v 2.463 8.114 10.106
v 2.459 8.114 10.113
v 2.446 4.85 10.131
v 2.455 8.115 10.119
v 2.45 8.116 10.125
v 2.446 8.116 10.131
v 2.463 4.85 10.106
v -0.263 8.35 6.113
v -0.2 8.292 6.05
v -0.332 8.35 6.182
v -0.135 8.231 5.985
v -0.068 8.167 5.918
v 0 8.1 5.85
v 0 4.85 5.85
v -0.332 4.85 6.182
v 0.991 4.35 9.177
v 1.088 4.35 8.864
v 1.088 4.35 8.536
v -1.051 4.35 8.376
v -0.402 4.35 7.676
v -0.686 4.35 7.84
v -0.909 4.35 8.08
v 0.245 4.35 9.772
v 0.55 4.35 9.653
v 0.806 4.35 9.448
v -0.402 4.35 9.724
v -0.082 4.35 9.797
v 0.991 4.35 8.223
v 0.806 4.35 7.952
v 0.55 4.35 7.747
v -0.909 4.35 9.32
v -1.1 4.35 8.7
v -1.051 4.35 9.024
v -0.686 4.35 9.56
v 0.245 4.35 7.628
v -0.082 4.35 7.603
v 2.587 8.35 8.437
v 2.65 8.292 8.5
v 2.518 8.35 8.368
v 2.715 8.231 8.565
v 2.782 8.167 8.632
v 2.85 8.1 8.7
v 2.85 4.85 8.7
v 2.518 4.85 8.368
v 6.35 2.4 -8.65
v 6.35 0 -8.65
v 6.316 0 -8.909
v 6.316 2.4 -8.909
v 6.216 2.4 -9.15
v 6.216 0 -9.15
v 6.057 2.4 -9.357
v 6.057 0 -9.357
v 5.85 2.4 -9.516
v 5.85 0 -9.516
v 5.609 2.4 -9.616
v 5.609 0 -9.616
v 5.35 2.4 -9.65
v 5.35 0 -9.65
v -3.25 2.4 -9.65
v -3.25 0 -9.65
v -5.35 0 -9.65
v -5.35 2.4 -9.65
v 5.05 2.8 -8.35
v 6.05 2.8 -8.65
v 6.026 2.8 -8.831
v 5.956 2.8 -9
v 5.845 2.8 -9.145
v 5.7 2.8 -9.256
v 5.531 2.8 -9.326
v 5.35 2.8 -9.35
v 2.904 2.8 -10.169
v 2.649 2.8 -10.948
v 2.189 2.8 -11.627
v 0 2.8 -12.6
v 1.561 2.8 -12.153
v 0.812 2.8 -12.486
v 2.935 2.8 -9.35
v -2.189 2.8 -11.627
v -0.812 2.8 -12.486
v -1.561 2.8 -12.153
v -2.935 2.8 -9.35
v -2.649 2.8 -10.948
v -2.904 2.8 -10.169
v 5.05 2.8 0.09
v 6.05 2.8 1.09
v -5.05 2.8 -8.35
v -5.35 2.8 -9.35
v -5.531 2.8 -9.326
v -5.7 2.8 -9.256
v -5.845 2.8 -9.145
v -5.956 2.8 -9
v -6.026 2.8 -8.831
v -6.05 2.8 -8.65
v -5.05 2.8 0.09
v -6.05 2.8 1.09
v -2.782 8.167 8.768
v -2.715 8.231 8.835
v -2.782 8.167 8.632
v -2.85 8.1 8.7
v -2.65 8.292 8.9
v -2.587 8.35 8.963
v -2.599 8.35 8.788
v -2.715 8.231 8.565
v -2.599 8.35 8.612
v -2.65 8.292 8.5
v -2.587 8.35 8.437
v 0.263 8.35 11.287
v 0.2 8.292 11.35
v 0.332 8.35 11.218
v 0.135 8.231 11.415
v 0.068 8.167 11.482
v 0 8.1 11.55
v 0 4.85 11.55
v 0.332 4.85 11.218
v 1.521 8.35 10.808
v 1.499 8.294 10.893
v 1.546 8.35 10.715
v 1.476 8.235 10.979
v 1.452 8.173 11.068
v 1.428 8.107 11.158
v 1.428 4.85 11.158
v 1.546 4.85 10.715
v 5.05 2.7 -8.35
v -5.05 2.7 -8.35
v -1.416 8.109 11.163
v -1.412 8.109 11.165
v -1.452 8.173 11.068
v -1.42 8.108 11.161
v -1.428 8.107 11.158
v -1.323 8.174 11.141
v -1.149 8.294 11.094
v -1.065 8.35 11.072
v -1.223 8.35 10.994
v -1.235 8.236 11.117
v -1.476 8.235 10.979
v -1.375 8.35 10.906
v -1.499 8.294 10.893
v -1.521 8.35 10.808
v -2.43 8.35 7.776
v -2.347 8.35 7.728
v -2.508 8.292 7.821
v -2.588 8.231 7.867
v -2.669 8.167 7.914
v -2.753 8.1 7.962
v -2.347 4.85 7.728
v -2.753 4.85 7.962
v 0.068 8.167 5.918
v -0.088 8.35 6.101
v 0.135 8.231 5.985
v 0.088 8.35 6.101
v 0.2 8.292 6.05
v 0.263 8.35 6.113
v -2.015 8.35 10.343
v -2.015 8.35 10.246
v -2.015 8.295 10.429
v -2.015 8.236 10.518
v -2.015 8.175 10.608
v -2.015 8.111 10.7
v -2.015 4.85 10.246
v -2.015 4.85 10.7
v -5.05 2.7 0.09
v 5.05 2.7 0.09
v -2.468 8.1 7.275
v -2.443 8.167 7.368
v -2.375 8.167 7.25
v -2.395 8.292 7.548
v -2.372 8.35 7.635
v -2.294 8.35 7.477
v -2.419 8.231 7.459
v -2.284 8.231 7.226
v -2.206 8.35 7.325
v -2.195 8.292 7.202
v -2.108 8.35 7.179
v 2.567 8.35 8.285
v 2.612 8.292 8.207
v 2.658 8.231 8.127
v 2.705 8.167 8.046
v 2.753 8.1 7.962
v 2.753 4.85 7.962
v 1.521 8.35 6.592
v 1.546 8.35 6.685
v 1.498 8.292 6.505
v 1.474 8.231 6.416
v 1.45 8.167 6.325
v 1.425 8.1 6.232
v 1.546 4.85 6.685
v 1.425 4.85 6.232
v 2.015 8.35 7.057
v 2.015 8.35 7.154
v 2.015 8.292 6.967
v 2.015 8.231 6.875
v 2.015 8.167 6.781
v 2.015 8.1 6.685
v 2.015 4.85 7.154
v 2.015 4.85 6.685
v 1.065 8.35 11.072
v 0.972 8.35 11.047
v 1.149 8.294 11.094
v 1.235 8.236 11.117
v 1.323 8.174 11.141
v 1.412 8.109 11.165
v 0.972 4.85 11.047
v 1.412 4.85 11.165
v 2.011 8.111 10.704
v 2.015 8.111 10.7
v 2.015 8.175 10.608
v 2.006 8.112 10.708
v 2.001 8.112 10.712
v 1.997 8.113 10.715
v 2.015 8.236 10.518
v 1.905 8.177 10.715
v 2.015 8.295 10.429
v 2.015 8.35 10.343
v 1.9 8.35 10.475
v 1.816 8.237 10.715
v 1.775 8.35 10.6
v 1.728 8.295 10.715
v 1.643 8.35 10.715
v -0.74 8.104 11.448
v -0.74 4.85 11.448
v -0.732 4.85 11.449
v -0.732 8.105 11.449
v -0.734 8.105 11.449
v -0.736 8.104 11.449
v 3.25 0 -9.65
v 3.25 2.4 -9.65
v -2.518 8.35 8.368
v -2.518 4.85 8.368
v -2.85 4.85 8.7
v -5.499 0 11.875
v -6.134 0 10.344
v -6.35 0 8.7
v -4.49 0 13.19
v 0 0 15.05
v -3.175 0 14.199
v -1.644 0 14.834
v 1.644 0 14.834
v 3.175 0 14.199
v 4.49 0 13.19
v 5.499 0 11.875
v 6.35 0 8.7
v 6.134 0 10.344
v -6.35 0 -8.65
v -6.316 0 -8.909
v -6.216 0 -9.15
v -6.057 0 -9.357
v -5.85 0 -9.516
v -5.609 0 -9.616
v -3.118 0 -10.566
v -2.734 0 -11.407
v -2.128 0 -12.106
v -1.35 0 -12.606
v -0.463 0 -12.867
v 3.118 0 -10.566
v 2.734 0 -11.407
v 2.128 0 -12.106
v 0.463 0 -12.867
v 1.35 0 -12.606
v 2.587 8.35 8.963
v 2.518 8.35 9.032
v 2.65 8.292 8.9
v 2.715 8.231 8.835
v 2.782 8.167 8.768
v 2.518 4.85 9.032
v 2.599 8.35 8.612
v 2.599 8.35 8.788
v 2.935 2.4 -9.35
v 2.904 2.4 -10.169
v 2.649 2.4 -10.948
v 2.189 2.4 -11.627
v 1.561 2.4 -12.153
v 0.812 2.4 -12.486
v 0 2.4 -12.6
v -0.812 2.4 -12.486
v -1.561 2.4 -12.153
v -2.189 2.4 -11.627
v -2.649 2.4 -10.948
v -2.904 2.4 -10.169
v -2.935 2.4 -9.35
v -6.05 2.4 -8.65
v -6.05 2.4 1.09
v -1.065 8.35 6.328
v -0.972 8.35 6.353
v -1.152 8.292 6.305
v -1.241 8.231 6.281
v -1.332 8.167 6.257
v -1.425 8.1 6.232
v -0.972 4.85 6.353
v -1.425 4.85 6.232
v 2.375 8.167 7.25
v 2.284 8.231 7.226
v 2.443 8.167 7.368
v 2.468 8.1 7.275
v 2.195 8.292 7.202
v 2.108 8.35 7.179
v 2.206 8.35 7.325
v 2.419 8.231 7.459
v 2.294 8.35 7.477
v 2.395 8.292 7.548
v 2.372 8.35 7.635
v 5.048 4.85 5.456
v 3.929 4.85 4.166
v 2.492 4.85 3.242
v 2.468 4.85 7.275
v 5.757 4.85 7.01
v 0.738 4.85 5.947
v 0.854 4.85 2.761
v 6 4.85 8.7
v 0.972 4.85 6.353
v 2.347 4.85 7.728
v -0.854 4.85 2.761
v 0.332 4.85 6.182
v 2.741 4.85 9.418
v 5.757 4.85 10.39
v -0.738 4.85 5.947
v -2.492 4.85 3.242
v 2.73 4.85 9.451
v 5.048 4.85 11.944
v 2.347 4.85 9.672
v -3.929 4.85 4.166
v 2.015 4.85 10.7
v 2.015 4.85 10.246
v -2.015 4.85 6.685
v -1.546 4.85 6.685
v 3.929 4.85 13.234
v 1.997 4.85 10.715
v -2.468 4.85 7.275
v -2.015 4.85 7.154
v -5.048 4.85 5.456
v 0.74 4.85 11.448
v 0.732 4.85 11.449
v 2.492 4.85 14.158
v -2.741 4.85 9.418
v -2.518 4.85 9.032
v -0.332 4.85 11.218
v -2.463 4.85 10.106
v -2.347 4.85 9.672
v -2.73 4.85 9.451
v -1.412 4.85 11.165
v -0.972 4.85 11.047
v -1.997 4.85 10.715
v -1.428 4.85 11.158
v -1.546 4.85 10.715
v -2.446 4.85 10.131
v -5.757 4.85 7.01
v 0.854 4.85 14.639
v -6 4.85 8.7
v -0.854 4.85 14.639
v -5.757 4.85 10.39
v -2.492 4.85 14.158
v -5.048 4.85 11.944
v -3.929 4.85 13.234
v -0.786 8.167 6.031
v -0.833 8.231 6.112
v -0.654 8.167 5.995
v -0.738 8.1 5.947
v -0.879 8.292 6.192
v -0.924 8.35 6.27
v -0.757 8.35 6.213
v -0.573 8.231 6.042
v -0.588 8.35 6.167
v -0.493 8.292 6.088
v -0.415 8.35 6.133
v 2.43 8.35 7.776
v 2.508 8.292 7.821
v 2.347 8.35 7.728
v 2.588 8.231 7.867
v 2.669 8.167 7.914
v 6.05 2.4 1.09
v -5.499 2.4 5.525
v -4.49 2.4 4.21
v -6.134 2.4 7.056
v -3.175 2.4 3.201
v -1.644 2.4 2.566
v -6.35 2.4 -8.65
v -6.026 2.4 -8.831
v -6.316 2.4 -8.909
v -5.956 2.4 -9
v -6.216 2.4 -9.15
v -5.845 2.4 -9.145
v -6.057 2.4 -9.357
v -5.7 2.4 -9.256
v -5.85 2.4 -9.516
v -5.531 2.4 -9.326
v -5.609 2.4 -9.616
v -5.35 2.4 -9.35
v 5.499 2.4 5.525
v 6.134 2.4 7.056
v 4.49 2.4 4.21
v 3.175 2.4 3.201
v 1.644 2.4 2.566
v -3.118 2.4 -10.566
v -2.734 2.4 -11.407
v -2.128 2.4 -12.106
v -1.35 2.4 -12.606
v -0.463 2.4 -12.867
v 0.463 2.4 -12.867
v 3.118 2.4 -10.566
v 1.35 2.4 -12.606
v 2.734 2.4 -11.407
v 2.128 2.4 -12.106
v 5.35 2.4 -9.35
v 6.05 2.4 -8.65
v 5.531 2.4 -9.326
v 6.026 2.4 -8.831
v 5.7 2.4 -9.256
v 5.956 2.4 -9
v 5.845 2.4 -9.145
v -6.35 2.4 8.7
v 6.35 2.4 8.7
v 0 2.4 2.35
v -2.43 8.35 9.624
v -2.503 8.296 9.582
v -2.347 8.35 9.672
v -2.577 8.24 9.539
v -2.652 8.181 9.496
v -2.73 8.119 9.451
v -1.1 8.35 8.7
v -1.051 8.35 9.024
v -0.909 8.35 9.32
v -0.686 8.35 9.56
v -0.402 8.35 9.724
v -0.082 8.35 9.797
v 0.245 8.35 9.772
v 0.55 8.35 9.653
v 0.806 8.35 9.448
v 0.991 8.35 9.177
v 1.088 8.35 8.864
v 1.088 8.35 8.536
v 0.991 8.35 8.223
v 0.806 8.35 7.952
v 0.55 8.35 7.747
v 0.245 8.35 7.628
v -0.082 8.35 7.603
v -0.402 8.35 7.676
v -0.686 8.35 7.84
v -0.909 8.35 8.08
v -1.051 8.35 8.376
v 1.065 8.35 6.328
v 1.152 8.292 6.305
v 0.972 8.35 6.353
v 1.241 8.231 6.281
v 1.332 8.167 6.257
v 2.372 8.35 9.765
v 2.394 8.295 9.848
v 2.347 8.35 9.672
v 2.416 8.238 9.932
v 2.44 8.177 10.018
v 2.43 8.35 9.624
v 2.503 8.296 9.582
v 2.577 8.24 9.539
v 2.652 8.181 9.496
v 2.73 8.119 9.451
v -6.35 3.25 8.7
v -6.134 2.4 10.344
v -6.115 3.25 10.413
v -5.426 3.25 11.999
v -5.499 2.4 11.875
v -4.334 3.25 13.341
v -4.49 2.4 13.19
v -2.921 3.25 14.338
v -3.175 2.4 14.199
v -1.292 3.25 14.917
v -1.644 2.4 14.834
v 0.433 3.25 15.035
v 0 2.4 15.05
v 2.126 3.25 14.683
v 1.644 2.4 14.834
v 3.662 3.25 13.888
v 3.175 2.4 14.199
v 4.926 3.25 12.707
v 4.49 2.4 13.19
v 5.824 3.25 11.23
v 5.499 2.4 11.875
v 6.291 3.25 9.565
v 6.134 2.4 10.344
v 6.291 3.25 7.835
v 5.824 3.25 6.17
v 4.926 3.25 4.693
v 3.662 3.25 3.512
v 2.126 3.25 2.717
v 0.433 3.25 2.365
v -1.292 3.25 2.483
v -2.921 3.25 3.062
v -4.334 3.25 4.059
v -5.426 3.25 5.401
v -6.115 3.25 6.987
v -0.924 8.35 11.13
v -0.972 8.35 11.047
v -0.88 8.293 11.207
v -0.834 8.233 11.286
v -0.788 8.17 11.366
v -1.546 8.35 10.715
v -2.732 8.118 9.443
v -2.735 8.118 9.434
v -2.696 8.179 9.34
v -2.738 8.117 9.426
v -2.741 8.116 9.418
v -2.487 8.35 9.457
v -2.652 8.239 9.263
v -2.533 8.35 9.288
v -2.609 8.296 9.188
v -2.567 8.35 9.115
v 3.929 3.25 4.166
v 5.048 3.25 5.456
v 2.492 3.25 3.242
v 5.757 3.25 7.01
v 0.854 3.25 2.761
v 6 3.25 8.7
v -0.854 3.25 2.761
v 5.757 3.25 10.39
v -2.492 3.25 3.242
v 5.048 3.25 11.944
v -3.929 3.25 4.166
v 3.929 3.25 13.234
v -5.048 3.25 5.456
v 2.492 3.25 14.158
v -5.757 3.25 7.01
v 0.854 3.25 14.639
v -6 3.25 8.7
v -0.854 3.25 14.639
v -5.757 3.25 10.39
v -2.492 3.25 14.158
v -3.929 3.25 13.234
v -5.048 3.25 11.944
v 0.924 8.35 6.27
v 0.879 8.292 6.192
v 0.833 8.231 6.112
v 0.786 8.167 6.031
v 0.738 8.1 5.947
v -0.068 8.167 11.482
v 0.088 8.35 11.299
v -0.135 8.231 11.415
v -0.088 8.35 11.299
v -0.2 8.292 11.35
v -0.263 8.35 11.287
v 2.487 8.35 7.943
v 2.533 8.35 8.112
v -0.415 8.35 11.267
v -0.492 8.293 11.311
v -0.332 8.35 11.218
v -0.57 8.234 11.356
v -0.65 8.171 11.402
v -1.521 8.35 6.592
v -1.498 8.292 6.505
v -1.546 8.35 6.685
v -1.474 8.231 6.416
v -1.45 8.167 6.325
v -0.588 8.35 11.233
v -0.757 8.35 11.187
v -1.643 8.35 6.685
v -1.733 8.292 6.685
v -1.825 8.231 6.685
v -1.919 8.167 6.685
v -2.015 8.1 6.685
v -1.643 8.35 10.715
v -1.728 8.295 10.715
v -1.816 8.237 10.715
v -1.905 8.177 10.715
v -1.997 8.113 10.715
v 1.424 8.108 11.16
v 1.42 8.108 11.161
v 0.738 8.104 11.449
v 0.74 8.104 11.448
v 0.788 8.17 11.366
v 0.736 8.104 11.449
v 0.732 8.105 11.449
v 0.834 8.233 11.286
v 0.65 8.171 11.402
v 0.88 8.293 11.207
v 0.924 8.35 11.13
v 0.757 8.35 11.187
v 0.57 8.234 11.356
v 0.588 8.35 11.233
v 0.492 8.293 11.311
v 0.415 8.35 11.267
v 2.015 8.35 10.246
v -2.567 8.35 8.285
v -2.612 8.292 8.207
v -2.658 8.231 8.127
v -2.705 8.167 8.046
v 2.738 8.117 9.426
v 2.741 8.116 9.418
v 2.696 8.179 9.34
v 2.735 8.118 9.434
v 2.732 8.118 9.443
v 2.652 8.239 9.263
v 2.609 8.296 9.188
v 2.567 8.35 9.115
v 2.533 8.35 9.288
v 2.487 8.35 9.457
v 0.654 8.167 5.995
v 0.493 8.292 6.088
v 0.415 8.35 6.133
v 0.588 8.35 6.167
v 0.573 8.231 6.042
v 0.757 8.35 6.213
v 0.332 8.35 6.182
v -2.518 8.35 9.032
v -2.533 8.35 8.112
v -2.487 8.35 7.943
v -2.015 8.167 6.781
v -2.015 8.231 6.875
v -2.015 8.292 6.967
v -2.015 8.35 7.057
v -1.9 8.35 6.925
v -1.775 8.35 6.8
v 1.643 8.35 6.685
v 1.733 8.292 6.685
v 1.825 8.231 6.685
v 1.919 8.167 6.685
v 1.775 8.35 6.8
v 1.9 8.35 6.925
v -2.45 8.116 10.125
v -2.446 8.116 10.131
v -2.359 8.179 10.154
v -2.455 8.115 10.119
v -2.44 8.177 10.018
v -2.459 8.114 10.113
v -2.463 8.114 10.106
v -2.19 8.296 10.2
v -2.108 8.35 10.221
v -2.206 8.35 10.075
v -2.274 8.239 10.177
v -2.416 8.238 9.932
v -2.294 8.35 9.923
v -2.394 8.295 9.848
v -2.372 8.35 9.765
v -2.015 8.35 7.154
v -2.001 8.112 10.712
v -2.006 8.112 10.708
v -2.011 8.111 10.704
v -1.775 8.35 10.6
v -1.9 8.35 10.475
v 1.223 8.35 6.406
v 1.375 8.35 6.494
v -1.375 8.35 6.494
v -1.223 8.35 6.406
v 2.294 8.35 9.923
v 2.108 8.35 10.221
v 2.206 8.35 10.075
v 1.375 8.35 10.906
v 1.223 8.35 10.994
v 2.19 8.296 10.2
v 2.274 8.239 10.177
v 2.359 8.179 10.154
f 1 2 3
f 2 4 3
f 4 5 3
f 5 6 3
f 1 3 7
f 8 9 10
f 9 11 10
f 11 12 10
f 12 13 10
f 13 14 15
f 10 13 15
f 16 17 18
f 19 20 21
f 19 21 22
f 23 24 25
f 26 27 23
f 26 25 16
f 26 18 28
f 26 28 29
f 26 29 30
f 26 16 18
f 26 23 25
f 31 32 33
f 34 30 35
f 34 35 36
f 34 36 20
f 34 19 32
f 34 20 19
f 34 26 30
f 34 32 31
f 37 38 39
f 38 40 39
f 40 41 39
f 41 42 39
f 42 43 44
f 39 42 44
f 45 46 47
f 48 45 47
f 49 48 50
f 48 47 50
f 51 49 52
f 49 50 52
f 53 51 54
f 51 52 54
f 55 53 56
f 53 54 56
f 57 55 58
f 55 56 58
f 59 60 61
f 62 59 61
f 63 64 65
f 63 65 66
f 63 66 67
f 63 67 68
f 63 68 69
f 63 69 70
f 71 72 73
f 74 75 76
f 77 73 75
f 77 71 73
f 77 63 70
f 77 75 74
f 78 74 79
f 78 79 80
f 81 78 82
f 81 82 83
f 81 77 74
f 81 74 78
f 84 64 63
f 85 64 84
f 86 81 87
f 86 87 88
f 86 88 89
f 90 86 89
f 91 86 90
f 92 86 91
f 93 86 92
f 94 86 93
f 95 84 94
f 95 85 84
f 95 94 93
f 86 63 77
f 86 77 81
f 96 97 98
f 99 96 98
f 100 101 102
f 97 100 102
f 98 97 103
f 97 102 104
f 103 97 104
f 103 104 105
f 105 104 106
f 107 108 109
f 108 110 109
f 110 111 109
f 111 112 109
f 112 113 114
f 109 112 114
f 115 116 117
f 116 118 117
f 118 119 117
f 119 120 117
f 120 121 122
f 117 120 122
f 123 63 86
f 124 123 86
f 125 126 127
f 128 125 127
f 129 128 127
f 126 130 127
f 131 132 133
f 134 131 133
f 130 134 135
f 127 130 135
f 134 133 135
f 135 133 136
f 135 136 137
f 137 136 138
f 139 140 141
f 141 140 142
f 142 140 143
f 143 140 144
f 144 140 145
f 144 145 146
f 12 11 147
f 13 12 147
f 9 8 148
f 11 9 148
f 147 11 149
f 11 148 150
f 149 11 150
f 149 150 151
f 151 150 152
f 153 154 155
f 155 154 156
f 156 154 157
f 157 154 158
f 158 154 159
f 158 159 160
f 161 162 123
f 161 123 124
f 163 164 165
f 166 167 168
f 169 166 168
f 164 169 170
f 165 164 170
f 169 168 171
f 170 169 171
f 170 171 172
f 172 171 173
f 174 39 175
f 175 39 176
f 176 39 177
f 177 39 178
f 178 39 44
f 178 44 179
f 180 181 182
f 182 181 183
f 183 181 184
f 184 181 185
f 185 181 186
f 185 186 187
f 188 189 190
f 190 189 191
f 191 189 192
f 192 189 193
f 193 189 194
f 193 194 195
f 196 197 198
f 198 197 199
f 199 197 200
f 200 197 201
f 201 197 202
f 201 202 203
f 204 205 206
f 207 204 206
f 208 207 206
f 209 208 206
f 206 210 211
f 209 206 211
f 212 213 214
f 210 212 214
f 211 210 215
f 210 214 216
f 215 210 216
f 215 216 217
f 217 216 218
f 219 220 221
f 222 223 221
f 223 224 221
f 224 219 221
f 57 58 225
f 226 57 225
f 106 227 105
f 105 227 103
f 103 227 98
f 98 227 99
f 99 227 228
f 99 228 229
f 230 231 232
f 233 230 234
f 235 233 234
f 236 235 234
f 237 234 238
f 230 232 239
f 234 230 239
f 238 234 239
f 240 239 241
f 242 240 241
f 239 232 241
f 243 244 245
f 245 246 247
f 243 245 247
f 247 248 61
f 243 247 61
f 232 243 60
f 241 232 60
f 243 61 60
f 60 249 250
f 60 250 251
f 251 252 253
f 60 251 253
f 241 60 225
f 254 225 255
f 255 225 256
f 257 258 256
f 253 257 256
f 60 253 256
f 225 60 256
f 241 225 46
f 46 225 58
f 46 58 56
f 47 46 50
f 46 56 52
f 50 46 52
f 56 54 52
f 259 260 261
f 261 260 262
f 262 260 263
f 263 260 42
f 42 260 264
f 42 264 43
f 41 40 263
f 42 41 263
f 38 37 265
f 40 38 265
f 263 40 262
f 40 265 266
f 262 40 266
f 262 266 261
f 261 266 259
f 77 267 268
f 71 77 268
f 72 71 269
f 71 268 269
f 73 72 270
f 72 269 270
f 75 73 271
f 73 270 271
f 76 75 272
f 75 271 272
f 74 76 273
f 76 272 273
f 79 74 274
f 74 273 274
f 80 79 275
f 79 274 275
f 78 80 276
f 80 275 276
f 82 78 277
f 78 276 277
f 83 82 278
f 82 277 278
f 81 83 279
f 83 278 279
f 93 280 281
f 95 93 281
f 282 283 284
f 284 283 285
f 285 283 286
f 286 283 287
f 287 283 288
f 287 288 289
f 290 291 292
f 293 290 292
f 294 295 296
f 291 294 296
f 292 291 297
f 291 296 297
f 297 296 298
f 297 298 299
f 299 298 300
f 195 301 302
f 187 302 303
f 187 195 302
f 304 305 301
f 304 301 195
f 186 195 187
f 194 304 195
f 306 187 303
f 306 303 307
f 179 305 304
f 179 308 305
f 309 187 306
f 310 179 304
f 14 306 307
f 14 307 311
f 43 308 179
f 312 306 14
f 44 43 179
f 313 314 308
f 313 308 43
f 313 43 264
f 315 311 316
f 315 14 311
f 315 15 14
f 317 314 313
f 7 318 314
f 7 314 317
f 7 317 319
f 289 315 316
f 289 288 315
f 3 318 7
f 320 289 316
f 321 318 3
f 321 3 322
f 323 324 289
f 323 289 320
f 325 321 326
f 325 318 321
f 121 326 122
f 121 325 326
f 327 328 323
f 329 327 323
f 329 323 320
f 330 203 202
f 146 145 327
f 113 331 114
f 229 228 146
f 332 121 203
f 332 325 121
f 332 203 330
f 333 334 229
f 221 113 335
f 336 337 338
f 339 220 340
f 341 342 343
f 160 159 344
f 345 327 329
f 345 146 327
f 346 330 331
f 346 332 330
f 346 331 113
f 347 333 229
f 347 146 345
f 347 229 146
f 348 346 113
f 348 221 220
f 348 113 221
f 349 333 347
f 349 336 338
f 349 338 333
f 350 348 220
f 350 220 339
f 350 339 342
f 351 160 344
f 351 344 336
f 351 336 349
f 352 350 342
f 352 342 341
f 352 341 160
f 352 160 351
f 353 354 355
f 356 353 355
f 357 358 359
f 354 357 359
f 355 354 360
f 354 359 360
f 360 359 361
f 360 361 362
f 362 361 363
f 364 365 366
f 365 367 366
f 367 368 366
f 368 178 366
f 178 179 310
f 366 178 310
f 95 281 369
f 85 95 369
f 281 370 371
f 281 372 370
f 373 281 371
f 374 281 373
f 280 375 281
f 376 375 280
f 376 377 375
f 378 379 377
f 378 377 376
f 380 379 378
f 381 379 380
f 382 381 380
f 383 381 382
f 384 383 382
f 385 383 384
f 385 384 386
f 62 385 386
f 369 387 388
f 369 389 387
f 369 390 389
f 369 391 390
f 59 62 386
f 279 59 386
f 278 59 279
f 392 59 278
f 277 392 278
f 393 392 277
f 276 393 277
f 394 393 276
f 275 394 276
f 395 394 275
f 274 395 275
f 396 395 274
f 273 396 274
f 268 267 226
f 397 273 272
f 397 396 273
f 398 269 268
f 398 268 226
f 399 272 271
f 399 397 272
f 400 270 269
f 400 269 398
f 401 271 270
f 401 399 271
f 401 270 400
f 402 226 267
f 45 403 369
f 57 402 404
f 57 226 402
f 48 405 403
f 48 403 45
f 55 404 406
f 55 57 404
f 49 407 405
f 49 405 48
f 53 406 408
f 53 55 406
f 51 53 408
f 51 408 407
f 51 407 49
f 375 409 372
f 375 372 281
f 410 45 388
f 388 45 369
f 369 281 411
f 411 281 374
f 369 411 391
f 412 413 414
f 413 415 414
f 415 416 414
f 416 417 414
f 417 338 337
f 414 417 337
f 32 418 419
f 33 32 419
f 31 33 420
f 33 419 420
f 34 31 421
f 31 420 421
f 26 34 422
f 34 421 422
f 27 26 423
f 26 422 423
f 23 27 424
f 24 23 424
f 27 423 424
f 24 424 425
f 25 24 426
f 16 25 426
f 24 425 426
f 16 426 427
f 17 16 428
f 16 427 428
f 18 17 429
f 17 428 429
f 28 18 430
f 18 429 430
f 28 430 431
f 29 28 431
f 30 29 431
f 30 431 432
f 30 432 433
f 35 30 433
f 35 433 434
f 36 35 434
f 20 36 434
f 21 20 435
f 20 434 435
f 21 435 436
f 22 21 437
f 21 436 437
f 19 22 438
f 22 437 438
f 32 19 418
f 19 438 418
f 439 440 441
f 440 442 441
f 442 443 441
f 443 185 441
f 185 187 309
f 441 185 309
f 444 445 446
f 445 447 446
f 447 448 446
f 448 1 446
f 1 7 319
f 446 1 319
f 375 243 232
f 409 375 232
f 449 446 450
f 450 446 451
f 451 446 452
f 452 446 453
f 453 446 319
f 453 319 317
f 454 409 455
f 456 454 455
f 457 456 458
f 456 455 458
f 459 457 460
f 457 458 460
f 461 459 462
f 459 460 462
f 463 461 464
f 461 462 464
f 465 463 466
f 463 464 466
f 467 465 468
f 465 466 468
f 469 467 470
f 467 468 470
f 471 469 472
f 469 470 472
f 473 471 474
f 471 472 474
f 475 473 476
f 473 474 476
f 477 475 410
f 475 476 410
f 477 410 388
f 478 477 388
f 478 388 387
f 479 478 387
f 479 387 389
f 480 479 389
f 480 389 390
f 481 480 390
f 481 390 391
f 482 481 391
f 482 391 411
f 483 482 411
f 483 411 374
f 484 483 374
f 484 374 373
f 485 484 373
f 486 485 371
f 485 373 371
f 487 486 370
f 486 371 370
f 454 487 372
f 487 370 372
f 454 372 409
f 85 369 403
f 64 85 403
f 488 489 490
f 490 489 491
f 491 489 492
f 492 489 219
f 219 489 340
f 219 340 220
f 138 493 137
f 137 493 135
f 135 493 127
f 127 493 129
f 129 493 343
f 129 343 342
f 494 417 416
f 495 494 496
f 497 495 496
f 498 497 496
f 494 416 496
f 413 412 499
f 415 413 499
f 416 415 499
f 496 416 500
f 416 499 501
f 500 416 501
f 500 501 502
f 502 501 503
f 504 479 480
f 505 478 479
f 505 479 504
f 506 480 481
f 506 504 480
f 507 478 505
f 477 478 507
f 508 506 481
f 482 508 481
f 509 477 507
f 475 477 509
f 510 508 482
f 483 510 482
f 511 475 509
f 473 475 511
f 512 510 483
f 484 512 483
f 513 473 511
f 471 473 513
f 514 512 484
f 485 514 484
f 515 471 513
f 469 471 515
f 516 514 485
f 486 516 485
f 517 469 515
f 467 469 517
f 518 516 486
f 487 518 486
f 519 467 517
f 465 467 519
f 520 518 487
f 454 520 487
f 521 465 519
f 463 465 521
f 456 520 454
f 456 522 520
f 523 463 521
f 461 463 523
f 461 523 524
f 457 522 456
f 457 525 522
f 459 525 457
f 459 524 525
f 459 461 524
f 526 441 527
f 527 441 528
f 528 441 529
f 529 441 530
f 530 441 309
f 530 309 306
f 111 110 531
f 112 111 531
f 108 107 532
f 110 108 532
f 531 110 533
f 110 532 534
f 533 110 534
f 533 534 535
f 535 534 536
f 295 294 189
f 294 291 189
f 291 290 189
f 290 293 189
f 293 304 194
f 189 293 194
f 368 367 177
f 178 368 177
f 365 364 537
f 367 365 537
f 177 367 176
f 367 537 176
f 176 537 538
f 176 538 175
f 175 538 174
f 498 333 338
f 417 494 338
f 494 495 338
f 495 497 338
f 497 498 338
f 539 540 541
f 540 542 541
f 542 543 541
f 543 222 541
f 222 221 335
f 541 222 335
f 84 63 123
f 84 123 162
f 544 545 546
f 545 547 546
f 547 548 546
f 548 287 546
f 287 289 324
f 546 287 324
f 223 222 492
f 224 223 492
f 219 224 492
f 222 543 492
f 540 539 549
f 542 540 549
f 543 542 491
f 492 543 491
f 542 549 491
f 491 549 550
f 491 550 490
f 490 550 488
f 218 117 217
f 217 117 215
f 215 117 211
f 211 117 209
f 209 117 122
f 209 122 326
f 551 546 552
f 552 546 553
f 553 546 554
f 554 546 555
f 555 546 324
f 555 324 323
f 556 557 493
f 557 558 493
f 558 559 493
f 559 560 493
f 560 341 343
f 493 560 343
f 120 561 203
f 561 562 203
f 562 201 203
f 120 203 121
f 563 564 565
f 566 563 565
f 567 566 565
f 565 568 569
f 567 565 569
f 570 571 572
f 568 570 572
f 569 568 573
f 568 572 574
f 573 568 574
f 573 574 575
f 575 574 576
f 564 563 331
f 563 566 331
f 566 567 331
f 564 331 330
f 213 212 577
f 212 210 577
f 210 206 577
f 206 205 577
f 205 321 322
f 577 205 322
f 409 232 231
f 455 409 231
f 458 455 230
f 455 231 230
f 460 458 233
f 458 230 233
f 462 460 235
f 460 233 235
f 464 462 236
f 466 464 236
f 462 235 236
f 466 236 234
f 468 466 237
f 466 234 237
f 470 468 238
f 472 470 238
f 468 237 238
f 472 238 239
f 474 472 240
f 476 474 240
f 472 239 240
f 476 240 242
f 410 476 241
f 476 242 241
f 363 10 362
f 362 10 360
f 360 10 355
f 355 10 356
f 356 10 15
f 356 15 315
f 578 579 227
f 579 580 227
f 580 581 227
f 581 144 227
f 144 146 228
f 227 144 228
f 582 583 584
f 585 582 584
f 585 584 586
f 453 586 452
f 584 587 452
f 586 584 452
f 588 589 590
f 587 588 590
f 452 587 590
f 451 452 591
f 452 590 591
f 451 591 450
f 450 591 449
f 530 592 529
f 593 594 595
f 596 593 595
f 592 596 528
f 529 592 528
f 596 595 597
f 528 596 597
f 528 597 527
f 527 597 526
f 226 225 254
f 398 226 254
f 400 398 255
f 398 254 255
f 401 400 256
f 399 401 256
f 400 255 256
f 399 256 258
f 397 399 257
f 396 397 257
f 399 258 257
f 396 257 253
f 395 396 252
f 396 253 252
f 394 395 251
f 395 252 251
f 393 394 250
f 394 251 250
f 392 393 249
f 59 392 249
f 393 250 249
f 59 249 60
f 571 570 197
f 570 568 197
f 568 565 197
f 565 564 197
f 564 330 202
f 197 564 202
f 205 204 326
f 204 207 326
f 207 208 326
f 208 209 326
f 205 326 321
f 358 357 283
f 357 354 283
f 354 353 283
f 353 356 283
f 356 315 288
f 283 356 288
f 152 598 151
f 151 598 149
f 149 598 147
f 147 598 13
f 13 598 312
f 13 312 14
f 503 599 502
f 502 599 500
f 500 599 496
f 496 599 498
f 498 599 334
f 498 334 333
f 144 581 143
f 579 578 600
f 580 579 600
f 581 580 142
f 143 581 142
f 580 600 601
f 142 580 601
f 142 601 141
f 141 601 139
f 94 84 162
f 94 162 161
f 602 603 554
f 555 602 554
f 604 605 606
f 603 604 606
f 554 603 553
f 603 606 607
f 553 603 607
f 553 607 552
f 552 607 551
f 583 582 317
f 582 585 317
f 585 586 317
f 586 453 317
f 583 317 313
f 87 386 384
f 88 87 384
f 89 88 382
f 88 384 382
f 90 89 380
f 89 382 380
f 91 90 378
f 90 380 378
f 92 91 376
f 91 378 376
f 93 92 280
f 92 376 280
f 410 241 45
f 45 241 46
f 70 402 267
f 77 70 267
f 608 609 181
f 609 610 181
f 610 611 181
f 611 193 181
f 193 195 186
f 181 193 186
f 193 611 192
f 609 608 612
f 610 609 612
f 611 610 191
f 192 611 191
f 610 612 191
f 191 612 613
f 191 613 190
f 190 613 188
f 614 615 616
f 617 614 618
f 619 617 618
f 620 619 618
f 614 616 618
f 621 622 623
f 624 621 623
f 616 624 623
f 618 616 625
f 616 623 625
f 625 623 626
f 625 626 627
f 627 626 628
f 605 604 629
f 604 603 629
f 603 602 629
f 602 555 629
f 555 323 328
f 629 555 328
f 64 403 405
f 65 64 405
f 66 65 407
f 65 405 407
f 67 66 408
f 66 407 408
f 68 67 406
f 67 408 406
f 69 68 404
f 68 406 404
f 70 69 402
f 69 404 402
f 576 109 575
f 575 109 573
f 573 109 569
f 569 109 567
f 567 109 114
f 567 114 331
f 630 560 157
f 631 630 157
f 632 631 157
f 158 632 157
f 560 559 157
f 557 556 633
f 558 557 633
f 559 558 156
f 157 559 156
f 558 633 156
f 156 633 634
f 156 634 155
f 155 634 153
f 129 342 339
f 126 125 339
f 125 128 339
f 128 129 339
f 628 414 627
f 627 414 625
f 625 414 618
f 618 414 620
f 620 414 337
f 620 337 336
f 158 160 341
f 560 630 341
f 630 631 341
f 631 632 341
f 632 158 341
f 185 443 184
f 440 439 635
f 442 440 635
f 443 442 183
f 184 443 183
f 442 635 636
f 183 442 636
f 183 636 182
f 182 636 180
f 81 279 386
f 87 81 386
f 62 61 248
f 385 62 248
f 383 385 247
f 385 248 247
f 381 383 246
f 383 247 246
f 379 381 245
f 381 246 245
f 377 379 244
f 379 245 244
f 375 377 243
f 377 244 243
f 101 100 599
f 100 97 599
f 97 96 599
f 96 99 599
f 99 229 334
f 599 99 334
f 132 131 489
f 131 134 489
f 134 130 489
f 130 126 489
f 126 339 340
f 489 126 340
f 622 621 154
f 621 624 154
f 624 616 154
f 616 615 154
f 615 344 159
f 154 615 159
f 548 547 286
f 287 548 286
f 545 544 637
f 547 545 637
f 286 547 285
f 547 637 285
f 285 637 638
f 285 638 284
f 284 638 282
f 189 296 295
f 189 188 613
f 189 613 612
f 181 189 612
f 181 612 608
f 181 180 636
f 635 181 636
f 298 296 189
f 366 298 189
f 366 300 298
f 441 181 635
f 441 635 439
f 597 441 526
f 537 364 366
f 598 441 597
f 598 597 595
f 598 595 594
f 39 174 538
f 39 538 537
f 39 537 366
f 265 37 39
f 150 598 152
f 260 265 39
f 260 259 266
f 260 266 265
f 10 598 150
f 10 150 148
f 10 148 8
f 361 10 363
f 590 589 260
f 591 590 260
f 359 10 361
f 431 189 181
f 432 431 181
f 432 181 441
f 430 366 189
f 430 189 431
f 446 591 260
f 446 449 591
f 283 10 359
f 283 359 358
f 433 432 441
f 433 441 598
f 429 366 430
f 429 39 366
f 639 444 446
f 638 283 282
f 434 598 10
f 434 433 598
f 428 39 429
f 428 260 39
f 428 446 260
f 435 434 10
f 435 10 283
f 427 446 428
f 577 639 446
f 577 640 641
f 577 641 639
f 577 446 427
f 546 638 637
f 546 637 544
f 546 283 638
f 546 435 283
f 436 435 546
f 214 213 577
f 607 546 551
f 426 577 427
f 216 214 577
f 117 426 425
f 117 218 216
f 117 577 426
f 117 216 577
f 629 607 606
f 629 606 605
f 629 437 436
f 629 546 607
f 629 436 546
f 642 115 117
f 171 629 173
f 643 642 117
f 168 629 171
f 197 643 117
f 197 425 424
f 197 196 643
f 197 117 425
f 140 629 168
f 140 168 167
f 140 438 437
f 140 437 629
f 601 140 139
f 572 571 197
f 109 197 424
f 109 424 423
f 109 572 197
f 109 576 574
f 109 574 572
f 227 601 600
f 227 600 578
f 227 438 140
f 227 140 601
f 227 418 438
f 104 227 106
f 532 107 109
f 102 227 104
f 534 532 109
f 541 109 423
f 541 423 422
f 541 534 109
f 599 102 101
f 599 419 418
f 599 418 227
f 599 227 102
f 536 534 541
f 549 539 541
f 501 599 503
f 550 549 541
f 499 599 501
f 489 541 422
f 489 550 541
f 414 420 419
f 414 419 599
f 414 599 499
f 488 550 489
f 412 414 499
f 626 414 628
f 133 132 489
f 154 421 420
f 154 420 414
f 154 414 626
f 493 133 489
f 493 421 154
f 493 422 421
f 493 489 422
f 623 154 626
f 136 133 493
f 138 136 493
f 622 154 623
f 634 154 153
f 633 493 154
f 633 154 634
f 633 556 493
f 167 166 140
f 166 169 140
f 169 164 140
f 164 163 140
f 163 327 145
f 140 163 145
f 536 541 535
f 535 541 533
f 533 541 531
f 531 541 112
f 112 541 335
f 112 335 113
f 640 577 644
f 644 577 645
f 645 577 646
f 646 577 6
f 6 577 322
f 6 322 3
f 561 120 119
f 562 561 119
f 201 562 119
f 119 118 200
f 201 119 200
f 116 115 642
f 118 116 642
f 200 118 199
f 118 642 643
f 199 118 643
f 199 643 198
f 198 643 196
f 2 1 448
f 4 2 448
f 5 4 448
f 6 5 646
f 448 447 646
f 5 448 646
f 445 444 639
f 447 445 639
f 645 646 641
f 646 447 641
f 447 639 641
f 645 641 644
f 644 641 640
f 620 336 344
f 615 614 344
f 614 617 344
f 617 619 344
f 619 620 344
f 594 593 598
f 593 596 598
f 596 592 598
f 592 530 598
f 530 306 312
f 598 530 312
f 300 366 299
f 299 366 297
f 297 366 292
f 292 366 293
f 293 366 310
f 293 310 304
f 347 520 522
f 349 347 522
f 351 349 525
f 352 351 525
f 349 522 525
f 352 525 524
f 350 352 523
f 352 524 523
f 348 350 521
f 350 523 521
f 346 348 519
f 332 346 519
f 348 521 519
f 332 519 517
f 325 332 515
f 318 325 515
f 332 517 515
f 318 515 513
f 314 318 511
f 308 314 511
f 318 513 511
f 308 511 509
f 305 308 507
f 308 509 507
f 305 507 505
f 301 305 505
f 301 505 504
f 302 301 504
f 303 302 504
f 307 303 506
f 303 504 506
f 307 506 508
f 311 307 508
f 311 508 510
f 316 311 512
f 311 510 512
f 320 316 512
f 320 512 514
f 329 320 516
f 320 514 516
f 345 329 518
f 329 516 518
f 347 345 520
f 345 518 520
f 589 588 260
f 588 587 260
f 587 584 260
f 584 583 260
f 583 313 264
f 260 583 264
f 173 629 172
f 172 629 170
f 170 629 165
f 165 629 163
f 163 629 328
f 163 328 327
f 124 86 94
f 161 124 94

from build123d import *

# Parameters (mm, degrees)
SKETCH1_R           = 6.35
SKETCH1_R_2         = 1
BOSS_EXTRUDE1_DEPTH = 2.4
SKETCH2_R           = 6.35
BOSS_EXTRUDE2_DEPTH = 0.85
SKETCH3_R           = 6
BOSS_EXTRUDE3_DEPTH = 1.6
BOSS_EXTRUDE4_DEPTH = 3.5
SKETCH6_R           = 1.1
CUT_EXTRUDE1_DEPTH  = 4
BOSS_EXTRUDE5_DEPTH = 0.4
SKETCH8_W           = 10.1
SKETCH8_H           = 8.440176683
CUT_EXTRUDE2_DEPTH  = 0.1


with BuildPart() as part:
    # Sketch1 → Boss-Extrude1 (new body)
    with BuildSketch(Plane(origin=(0, 0, 0), x_dir=(1, 0, 0), z_dir=(0, 1, 0))):
        with Locations((0, -8.7)):
            Circle(SKETCH1_R)
        with BuildLine():
            Line((-3.25, 9.65), (-5.35, 9.65))
            ThreePointArc((-5.35, 9.65), (-4.642893219, 9.357106781), (-4.35, 8.65))
            ThreePointArc((-4.35, 8.65), (-5.350000006, 7.65), (-6.35, 8.650000012))
            Line((-6.35, 8.650000012), (-6.35, -8.700000013))
            ThreePointArc((-6.35, -8.700000013), (-7e-09, -2.35), (6.35, -8.7))
            Line((6.35, -8.7), (6.35, 8.65))
            ThreePointArc((6.35, 8.65), (4.642893215, 7.942893223), (5.350000012, 9.65))
            Line((5.350000012, 9.65), (3.25, 9.65))
            ThreePointArc((3.25, 9.65), (0, 6.4), (-3.25, 9.65))
        make_face()
        with Locations((-5.35, 8.65)):
            Circle(SKETCH1_R_2)
        with BuildLine():
            ThreePointArc((3.25, 9.65), (0, 12.9), (-3.25, 9.65))
            Line((-3.25, 9.65), (3.25, 9.65))
        make_face()
        with BuildLine():
            Line((3.25, 9.65), (-3.25, 9.65))
            ThreePointArc((-3.25, 9.65), (0, 6.4), (3.25, 9.65))
        make_face()
        with Locations((5.35, 8.65)):
            Circle(SKETCH1_R_2)
    extrude(amount=BOSS_EXTRUDE1_DEPTH)

    # Sketch2 → Boss-Extrude2 (add)
    with BuildSketch(Plane(origin=(0, 2.4, 0), x_dir=(-1, 0, 0), z_dir=(0, 1, 0))):
        with Locations((0, 8.7)):
            Circle(SKETCH2_R)
    extrude(amount=BOSS_EXTRUDE2_DEPTH)

    # Sketch3 → Boss-Extrude3 (add)
    with BuildSketch(Plane(origin=(0, 3.25, 0), x_dir=(-1, 0, 0), z_dir=(0, 1, 0))):
        with Locations((0, 8.7)):
            Circle(SKETCH3_R)
    extrude(amount=BOSS_EXTRUDE3_DEPTH)

    # Sketch4 → Boss-Extrude4 (add)
    with BuildSketch(Plane(origin=(0, 4.85, 0), x_dir=(-1, 0, 0), z_dir=(0, 1, 0))):
        Polygon((2.518440958, 8.368440958), (2.85, 8.7), (2.518440958, 9.031559042), (2.741390732, 9.417719379), (2.729517437, 9.451127629), (2.346813369, 9.672081926), (2.463209043, 10.106476495), (2.445926072, 10.130960886), (2.015254326, 10.246359032), (2.015254326, 10.700296057), (1.996868143, 10.715254326), (1.546359032, 10.715254326), (1.427678707, 11.15817533), (1.412422166, 11.16480218), (0.972081926, 11.046813369), (0.740314632, 11.448246096), (0.731654815, 11.44943636), (0.331559042, 11.218440958), (0, 11.55), (-0.331559042, 11.218440958), (-0.731654815, 11.44943636), (-0.740314632, 11.448246096), (-0.972081926, 11.046813369), (-1.412422166, 11.16480218), (-1.427678707, 11.15817533), (-1.546359032, 10.715254326), (-1.996868143, 10.715254326), (-2.015254326, 10.700296057), (-2.015254326, 10.246359032), (-2.445926072, 10.130960886), (-2.463209043, 10.106476495), (-2.346813369, 9.672081926), (-2.729517437, 9.451127629), (-2.741390732, 9.417719379), (-2.518440958, 9.031559042), (-2.85, 8.7), (-2.518440958, 8.368440958), (-2.752888605, 7.962365721), (-2.346813369, 7.727918074), (-2.468172401, 7.275), (-2.015254326, 7.153640968), (-2.015254326, 6.684745674), (-1.546359032, 6.684745674), (-1.425, 6.231827599), (-0.972081926, 6.353186631), (-0.737634279, 5.947111395), (-0.331559042, 6.181559042), (0, 5.85), (0.331559042, 6.181559042), (0.737634279, 5.947111395), (0.972081926, 6.353186631), (1.425, 6.231827599), (1.546359032, 6.684745674), (2.015254326, 6.684745674), (2.015254326, 7.153640968), (2.468172401, 7.275), (2.346813369, 7.727918074), (2.752888605, 7.962365721), align=None)
    extrude(amount=BOSS_EXTRUDE4_DEPTH)

    # Sketch5 → Cut-Revolve1 (revolve, cut)
    with BuildSketch(Plane(origin=(0, 0, 0), x_dir=(0, 0, -1), z_dir=(1, 0, 0))):
        Polygon((-6.9, 9.15), (-4.454839661, 9.15), (-4.454839661, 6.704839661), align=None)
    revolve(axis=Axis((0, 8.077813164, 8.7), (0, -1, 0)), mode=Mode.SUBTRACT)

    # Sketch6 → Cut-Extrude1 (cut)
    with BuildSketch(Plane(origin=(0, 8.35, 0), x_dir=(-1, 0, 0), z_dir=(0, 1, 0))):
        with Locations((0, 8.7)):
            Circle(SKETCH6_R)
    extrude(amount=-CUT_EXTRUDE1_DEPTH, mode=Mode.SUBTRACT)

    # Sketch7 → Boss-Extrude5 (add)
    with BuildSketch(Plane(origin=(0, 2.4, 0), x_dir=(-1, 0, 0), z_dir=(0, 1, 0))):
        with BuildLine():
            Line((2.934706118, -9.35), (5.35, -9.35))
            ThreePointArc((5.35, -9.35), (5.844974747, -9.144974747), (6.05, -8.65))
            Line((6.05, -8.65), (6.05, 1.090176683))
            Line((6.05, 1.090176683), (-6.05, 1.090176683))
            Line((-6.05, 1.090176683), (-6.05, -1.654552581))
            Line((-6.05, -1.654552581), (-6.05, -8.65))
            ThreePointArc((-6.05, -8.65), (-5.844974747, -9.144974747), (-5.35, -9.35))
            Line((-5.35, -9.35), (-2.934706118, -9.35))
            ThreePointArc((-2.934706118, -9.35), (0, -12.6), (2.934706118, -9.35))
        make_face()
    extrude(amount=BOSS_EXTRUDE5_DEPTH)

    # Sketch8 → Cut-Extrude2 (cut)
    with BuildSketch(Plane(origin=(0, 2.8, 0), x_dir=(-1, 0, 0), z_dir=(0, 1, 0))):
        with Locations((0, -4.129911659)):
            Rectangle(SKETCH8_W, SKETCH8_H)
    extrude(amount=-CUT_EXTRUDE2_DEPTH, mode=Mode.SUBTRACT)


solid = part.part
